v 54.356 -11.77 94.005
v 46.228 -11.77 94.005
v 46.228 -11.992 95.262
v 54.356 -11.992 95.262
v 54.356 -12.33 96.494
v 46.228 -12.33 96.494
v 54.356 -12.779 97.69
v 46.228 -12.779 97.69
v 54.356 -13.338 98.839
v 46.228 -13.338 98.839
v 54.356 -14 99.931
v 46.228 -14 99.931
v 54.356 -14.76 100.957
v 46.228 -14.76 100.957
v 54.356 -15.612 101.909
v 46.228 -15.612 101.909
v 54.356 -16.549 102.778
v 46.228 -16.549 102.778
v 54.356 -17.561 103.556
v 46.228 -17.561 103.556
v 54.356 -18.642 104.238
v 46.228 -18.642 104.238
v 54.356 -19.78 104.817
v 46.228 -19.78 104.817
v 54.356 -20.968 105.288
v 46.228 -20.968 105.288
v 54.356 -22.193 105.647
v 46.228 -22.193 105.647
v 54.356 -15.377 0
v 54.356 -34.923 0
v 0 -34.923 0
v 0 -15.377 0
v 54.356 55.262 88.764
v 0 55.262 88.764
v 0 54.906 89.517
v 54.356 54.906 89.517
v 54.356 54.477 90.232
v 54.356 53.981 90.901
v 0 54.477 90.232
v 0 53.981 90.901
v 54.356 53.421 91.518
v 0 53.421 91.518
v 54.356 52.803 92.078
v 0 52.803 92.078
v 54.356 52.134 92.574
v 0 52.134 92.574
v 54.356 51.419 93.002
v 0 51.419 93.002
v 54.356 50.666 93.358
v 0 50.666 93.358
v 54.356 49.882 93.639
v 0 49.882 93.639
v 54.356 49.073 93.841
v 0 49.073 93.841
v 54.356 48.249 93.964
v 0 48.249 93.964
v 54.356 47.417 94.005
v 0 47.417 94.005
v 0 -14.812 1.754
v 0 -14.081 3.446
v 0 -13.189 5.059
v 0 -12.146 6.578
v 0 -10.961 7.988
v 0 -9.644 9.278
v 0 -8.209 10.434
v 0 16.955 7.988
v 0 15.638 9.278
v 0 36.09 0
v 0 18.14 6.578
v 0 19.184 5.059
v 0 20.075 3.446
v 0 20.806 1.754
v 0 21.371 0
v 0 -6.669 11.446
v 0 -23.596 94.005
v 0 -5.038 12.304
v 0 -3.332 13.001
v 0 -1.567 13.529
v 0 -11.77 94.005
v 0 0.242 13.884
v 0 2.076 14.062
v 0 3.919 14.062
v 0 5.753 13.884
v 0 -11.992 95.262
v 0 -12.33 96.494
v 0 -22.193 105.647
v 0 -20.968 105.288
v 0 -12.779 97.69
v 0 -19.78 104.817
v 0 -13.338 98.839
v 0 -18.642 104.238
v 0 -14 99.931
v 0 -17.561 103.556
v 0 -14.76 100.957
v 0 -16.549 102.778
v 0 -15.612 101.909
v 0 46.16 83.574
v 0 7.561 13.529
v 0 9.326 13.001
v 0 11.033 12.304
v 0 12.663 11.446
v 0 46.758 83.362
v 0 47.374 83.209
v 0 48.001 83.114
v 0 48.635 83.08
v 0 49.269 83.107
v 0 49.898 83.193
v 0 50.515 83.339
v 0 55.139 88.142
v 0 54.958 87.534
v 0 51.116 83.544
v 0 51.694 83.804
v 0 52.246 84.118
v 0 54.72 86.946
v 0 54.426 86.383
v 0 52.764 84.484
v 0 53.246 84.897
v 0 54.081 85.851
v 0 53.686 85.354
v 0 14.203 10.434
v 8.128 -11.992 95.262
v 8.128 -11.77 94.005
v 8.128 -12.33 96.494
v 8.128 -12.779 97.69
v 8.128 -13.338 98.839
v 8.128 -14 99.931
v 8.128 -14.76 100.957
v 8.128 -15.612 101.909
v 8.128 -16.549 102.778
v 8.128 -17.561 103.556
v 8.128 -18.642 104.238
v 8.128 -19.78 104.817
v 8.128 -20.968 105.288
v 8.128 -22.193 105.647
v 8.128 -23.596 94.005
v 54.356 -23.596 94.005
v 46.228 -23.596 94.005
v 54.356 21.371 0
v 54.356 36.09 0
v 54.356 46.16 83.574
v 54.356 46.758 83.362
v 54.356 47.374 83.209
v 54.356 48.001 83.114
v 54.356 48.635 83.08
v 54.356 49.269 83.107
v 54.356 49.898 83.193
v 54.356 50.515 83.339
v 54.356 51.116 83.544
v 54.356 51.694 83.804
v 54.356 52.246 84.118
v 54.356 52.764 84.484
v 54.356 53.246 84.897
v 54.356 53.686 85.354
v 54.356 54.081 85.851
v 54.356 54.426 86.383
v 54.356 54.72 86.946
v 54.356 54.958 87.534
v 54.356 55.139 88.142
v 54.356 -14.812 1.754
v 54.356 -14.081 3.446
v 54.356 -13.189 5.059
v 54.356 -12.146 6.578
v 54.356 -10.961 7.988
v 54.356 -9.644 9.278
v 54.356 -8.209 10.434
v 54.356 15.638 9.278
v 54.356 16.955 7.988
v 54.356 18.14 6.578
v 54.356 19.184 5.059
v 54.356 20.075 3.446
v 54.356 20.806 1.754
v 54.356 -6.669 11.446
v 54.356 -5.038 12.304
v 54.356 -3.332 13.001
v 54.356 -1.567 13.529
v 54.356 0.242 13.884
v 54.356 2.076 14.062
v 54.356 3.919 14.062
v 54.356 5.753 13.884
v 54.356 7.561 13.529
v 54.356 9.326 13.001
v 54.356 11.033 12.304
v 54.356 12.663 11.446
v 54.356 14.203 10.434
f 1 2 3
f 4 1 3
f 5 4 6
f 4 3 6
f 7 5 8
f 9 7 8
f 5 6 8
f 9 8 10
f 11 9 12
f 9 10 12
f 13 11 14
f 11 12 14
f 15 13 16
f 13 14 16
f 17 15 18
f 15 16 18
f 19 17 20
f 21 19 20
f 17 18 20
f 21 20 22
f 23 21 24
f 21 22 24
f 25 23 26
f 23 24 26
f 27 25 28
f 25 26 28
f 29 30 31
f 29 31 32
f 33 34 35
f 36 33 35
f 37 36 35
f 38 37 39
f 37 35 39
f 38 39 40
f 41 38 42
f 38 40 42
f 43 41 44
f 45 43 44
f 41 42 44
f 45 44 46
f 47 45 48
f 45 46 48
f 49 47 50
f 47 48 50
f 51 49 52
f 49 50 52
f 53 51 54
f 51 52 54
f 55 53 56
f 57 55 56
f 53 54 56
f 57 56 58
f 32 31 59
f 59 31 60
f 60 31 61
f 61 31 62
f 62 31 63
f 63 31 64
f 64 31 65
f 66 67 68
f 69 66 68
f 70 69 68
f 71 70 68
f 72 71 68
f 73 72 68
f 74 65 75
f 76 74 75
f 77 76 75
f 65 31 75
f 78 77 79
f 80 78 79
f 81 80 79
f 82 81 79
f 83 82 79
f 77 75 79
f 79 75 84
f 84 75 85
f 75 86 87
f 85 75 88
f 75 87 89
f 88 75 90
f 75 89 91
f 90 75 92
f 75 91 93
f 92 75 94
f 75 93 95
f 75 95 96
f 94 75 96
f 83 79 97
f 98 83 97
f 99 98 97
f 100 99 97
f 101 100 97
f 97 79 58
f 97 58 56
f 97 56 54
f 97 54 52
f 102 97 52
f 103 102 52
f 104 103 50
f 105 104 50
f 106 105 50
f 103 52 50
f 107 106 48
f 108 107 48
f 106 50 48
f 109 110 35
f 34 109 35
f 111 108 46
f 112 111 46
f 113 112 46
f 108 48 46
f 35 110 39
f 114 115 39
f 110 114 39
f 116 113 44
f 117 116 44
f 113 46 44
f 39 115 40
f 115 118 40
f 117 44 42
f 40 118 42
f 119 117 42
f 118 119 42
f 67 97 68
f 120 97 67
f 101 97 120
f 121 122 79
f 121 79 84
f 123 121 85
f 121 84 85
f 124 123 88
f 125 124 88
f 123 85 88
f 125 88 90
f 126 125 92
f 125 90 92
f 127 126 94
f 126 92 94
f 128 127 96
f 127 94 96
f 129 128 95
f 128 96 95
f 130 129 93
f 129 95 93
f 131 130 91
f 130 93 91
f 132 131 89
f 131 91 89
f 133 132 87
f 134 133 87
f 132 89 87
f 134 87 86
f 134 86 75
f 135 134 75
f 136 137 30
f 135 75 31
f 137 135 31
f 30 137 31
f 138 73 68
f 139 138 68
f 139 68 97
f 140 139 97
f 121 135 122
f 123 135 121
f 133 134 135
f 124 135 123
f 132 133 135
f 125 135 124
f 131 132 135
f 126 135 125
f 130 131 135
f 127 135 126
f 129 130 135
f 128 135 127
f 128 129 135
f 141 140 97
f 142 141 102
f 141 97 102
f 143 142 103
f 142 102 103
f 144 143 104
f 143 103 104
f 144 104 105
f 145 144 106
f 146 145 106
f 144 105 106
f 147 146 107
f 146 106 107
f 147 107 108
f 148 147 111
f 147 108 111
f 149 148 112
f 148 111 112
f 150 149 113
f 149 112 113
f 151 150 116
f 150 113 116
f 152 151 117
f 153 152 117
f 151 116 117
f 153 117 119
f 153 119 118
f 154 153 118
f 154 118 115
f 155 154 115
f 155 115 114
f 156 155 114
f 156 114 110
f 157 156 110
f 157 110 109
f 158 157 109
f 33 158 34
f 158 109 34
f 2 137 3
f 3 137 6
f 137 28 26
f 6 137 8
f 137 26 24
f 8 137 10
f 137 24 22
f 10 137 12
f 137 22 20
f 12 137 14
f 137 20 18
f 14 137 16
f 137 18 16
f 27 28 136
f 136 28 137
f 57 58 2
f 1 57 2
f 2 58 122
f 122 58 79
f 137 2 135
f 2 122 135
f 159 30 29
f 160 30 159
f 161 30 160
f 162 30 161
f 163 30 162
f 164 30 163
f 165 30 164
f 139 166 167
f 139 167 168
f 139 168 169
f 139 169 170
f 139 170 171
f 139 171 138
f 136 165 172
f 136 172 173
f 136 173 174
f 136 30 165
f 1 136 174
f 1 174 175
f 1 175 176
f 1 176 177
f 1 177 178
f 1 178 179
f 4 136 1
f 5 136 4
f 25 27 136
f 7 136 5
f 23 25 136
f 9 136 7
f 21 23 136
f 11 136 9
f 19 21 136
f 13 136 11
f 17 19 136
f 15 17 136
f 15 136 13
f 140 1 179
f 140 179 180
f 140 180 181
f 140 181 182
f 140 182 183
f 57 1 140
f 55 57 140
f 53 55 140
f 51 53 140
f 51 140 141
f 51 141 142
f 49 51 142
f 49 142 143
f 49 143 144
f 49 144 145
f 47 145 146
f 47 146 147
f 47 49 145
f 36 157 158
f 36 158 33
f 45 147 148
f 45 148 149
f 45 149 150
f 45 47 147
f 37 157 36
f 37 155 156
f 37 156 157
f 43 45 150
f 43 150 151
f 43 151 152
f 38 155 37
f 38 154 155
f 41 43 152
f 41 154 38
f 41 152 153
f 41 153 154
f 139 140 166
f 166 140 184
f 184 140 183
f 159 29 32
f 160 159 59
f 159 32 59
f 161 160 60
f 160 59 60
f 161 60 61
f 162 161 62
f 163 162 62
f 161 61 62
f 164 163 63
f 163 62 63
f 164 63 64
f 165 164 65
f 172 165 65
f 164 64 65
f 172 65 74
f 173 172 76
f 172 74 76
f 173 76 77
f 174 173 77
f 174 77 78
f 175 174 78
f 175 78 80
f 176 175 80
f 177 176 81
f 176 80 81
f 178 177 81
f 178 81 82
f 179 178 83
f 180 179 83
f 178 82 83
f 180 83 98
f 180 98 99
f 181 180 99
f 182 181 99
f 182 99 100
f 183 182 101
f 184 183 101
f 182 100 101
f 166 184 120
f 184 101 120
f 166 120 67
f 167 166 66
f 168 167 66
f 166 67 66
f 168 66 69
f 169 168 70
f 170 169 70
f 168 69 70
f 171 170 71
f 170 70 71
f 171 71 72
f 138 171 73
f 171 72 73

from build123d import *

# Parameters (mm, degrees)
F1_DEPTH = 54.356
F2_DEPTH = 8.128
F3_START = 38.1
F3_DEPTH = 8.128


with BuildPart() as f1:
    # F0 (on Right) → F1 (new body)
    with BuildSketch(Plane.YZ):
        with BuildLine():
            ThreePointArc((-15.3765147552, 0), (2.9971175827, 14.084579319), (21.3707499206, 0))
            Line((21.3707499206, 0), (36.0901206732, 0))
            Line((36.0901206732, 0), (46.1599725041, 83.5735037118))
            Line((46.1599725041, 83.5735037118), (47.4168173969, 94.0045341849))
            Line((47.4168173969, 94.0045341849), (-11.7700314149, 94.0045341849))
            Line((-11.7700314149, 94.0045341849), (-23.5962346196, 94.0045341849))
            Line((-23.5962346196, 94.0045341849), (-34.9229313433, 0))
            Line((-34.9229313433, 0), (-15.3765147552, 0))
        make_face()
        with BuildLine():
            Line((47.4168173969, 94.0045341849), (46.1599725041, 83.5735037118))
            ThreePointArc((46.1599725041, 83.5735037118), (51.9737480075, 83.9546377095), (55.2620962262, 88.7642130256))
            ThreePointArc((55.2620962262, 88.7642130256), (52.1340561486, 92.5739673663), (47.4168173969, 94.0045341849))
        make_face()
    extrude(amount=F1_DEPTH)

    # F0 (on Right) → F2 (join)
    with BuildSketch(Plane.YZ):
        with BuildLine():
            Line((-22.1934446874, 105.6468176636), (-23.5962346196, 94.0045341849))
            Line((-23.5962346196, 94.0045341849), (-11.7700314149, 94.0045341849))
            ThreePointArc((-11.7700314149, 94.0045341849), (-15.1754299061, 101.4428755336), (-22.1934446874, 105.6468176636))
        make_face()
    extrude(amount=F2_DEPTH)

    # F2_face (on face) → F3 (join)
    with BuildSketch(Plane(origin=(8.128, -18.3884037898, 98.5907501288), x_dir=(0, 1, 0), z_dir=(1, 0, 0)).offset(F3_START)):
        with BuildLine():
            ThreePointArc((6.6183723749, -4.5862159439), (3.2129738836, 2.8521254048), (-3.8050408977, 7.0560675348))
            Line((-3.8050408977, 7.0560675348), (-5.2078308298, -4.5862159439))
            Line((-5.2078308298, -4.5862159439), (6.6183723749, -4.5862159439))
        make_face()
    extrude(amount=F3_DEPTH)


solid = f1.part
